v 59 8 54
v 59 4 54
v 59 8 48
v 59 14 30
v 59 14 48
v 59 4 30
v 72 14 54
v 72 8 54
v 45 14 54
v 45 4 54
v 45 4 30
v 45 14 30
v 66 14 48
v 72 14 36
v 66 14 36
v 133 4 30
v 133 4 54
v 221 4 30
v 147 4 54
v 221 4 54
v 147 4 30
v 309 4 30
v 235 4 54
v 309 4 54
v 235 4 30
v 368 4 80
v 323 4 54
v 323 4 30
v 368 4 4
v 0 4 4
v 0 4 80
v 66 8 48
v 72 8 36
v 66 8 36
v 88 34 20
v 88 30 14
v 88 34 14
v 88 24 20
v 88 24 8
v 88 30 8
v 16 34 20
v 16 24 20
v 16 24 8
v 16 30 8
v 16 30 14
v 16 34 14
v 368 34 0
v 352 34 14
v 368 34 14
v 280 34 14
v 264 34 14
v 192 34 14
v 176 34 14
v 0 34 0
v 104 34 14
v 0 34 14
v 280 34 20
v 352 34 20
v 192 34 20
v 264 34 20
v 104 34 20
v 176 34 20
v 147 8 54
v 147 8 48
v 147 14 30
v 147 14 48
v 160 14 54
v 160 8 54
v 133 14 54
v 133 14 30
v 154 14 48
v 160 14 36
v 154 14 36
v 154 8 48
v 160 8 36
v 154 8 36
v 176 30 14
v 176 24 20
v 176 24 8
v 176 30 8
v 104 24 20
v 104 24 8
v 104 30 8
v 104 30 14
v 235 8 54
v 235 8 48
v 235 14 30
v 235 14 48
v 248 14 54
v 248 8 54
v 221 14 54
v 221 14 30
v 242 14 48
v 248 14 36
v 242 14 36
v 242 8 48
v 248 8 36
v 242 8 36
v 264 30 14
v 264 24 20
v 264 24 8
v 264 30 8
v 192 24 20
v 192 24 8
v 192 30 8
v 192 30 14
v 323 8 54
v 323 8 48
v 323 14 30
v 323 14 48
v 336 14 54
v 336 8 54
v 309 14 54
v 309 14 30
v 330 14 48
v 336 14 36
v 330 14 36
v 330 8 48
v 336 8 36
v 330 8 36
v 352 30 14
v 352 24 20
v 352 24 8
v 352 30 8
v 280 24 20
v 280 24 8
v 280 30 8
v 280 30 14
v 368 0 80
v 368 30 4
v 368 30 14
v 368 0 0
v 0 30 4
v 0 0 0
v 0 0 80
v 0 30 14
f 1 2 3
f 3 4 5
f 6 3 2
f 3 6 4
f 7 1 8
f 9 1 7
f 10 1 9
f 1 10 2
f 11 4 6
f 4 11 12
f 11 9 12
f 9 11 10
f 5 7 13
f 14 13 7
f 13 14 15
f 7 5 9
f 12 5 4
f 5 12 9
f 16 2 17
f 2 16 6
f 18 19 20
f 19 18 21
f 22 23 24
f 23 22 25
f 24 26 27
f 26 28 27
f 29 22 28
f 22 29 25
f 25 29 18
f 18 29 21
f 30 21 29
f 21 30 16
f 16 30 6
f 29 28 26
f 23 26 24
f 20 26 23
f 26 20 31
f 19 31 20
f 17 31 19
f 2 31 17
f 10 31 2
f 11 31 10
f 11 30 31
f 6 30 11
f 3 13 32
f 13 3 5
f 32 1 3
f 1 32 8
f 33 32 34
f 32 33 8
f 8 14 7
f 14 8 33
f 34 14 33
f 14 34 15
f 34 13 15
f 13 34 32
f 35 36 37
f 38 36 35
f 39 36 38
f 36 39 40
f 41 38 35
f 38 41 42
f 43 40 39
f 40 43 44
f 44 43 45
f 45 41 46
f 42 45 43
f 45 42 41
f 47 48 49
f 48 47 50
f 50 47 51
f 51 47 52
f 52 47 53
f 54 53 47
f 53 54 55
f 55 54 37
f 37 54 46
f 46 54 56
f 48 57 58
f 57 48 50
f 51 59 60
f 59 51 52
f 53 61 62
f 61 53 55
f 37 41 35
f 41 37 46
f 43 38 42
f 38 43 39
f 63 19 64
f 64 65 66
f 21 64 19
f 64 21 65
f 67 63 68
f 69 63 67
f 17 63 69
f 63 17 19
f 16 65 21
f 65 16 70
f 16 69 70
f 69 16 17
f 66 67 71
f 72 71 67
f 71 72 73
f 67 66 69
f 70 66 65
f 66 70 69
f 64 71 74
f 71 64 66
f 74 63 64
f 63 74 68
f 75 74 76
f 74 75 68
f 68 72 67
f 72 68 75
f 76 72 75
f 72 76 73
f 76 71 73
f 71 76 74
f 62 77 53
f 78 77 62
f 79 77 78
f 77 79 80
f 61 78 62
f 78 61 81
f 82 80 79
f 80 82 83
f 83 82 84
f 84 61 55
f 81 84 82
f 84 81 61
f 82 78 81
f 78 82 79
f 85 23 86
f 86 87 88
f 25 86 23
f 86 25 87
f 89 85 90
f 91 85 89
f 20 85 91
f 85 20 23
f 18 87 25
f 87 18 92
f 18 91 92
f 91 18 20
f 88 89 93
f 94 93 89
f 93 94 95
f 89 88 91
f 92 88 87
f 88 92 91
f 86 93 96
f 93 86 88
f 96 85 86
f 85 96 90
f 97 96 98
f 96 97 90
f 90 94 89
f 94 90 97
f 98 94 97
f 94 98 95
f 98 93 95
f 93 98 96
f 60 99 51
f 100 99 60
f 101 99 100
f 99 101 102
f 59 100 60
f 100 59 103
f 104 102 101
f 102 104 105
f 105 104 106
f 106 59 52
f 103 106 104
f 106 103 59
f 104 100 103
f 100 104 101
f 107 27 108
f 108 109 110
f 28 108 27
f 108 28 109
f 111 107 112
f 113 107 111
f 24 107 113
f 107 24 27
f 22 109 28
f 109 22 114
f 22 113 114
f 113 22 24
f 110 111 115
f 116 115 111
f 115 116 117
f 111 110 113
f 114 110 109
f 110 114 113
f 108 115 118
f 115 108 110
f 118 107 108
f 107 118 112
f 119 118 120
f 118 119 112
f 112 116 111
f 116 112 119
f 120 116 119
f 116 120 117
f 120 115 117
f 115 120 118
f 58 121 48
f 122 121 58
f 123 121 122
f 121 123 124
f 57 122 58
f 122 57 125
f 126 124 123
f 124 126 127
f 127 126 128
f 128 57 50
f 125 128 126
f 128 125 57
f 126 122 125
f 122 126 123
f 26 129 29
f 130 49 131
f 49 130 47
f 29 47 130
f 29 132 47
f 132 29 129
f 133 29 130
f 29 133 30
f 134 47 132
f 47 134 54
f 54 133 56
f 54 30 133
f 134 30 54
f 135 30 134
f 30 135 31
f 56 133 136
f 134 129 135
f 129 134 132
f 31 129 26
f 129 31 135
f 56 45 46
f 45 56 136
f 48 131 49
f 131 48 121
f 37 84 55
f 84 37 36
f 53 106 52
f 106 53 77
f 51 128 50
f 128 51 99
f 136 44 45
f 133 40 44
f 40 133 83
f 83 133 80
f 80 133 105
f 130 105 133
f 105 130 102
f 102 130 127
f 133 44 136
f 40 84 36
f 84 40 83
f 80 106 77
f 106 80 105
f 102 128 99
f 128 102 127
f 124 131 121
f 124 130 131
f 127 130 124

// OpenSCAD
// file: ../../common/utils.scad
// Common utilities and shared variables
// Include this file at the top of your models:
//   include <../../common/utils.scad>

// ── Units ────────────────────────────────────────────────────────────────────
// All dimensions in millimeters

// ── Print tolerances ─────────────────────────────────────────────────────────
// Gap to add when two parts need to fit together (e.g., peg into a hole)
FIT_CLEARANCE = 0.2;  // mm

// Tolerance for press-fit / tight connections
PRESS_FIT = 0.1;  // mm

// ── Quality settings ─────────────────────────────────────────────────────────
// Override per-model if needed
$fn = $preview ? 32 : 128;  // Circle/sphere resolution

// ── Common layer heights ──────────────────────────────────────────────────────
LAYER_HEIGHT      = 0.2;   // standard
FIRST_LAYER       = 0.3;   // slightly thicker first layer
MIN_WALL          = 0.4;   // single extrusion width (0.4 mm nozzle)
// main file
// Concept 1: wall or cabinet-side hook rail for loop-back lids.
// Intended for BlenderBottle-style lids with a rear carry loop.
//
// Usage:
//   openscad -o 01-hook-rail.stl 01-hook-rail.scad

include <../../common/utils.scad>

lid_d = 78;
lid_h = 44;
loop_t = 7;

n_lids = 4;
station_gap = 10;
side_margin = 8;
base_t = 4;
base_depth = 34;
front_lip_h = 10;
backplate_t = 4;
backplate_h = 76;

hook_post_w = 14;
hook_post_d = 10;
hook_post_h = 24;
hook_t = 6;
hook_arm_l = 20;
hook_keeper_drop = 12;
hook_z = 48;

bumper_h = 12;
bumper_d = 10;
bumper_z = 8;

station_w = lid_d + station_gap;
total_w = 2 * side_margin + n_lids * station_w;

module hook_station(station_x) {
    bumper_w = station_w - 16;

    translate([station_x - hook_post_w / 2, backplate_t, hook_z - hook_post_h + hook_t])
        cube([hook_post_w, hook_post_d, hook_post_h]);

    translate([station_x - hook_t / 2, backplate_t + hook_post_d - hook_t, hook_z])
        cube([hook_arm_l, hook_t, hook_t]);

    translate([station_x + hook_arm_l - hook_t, backplate_t + hook_post_d - hook_t, hook_z - hook_keeper_drop])
        cube([hook_t, hook_t, hook_keeper_drop + hook_t]);

    translate([station_x - bumper_w / 2, base_depth - bumper_d, bumper_z])
        cube([bumper_w, bumper_d, bumper_h]);
}

union() {
    cube([total_w, base_depth, base_t]);

    translate([0, 0, base_t])
        cube([total_w, backplate_t, backplate_h]);

    translate([0, base_depth - 4, base_t])
        cube([total_w, 4, front_lip_h]);

    for (index = [0 : n_lids - 1]) {
        station_x = side_margin + station_w / 2 + index * station_w;
        hook_station(station_x);
    }
}
